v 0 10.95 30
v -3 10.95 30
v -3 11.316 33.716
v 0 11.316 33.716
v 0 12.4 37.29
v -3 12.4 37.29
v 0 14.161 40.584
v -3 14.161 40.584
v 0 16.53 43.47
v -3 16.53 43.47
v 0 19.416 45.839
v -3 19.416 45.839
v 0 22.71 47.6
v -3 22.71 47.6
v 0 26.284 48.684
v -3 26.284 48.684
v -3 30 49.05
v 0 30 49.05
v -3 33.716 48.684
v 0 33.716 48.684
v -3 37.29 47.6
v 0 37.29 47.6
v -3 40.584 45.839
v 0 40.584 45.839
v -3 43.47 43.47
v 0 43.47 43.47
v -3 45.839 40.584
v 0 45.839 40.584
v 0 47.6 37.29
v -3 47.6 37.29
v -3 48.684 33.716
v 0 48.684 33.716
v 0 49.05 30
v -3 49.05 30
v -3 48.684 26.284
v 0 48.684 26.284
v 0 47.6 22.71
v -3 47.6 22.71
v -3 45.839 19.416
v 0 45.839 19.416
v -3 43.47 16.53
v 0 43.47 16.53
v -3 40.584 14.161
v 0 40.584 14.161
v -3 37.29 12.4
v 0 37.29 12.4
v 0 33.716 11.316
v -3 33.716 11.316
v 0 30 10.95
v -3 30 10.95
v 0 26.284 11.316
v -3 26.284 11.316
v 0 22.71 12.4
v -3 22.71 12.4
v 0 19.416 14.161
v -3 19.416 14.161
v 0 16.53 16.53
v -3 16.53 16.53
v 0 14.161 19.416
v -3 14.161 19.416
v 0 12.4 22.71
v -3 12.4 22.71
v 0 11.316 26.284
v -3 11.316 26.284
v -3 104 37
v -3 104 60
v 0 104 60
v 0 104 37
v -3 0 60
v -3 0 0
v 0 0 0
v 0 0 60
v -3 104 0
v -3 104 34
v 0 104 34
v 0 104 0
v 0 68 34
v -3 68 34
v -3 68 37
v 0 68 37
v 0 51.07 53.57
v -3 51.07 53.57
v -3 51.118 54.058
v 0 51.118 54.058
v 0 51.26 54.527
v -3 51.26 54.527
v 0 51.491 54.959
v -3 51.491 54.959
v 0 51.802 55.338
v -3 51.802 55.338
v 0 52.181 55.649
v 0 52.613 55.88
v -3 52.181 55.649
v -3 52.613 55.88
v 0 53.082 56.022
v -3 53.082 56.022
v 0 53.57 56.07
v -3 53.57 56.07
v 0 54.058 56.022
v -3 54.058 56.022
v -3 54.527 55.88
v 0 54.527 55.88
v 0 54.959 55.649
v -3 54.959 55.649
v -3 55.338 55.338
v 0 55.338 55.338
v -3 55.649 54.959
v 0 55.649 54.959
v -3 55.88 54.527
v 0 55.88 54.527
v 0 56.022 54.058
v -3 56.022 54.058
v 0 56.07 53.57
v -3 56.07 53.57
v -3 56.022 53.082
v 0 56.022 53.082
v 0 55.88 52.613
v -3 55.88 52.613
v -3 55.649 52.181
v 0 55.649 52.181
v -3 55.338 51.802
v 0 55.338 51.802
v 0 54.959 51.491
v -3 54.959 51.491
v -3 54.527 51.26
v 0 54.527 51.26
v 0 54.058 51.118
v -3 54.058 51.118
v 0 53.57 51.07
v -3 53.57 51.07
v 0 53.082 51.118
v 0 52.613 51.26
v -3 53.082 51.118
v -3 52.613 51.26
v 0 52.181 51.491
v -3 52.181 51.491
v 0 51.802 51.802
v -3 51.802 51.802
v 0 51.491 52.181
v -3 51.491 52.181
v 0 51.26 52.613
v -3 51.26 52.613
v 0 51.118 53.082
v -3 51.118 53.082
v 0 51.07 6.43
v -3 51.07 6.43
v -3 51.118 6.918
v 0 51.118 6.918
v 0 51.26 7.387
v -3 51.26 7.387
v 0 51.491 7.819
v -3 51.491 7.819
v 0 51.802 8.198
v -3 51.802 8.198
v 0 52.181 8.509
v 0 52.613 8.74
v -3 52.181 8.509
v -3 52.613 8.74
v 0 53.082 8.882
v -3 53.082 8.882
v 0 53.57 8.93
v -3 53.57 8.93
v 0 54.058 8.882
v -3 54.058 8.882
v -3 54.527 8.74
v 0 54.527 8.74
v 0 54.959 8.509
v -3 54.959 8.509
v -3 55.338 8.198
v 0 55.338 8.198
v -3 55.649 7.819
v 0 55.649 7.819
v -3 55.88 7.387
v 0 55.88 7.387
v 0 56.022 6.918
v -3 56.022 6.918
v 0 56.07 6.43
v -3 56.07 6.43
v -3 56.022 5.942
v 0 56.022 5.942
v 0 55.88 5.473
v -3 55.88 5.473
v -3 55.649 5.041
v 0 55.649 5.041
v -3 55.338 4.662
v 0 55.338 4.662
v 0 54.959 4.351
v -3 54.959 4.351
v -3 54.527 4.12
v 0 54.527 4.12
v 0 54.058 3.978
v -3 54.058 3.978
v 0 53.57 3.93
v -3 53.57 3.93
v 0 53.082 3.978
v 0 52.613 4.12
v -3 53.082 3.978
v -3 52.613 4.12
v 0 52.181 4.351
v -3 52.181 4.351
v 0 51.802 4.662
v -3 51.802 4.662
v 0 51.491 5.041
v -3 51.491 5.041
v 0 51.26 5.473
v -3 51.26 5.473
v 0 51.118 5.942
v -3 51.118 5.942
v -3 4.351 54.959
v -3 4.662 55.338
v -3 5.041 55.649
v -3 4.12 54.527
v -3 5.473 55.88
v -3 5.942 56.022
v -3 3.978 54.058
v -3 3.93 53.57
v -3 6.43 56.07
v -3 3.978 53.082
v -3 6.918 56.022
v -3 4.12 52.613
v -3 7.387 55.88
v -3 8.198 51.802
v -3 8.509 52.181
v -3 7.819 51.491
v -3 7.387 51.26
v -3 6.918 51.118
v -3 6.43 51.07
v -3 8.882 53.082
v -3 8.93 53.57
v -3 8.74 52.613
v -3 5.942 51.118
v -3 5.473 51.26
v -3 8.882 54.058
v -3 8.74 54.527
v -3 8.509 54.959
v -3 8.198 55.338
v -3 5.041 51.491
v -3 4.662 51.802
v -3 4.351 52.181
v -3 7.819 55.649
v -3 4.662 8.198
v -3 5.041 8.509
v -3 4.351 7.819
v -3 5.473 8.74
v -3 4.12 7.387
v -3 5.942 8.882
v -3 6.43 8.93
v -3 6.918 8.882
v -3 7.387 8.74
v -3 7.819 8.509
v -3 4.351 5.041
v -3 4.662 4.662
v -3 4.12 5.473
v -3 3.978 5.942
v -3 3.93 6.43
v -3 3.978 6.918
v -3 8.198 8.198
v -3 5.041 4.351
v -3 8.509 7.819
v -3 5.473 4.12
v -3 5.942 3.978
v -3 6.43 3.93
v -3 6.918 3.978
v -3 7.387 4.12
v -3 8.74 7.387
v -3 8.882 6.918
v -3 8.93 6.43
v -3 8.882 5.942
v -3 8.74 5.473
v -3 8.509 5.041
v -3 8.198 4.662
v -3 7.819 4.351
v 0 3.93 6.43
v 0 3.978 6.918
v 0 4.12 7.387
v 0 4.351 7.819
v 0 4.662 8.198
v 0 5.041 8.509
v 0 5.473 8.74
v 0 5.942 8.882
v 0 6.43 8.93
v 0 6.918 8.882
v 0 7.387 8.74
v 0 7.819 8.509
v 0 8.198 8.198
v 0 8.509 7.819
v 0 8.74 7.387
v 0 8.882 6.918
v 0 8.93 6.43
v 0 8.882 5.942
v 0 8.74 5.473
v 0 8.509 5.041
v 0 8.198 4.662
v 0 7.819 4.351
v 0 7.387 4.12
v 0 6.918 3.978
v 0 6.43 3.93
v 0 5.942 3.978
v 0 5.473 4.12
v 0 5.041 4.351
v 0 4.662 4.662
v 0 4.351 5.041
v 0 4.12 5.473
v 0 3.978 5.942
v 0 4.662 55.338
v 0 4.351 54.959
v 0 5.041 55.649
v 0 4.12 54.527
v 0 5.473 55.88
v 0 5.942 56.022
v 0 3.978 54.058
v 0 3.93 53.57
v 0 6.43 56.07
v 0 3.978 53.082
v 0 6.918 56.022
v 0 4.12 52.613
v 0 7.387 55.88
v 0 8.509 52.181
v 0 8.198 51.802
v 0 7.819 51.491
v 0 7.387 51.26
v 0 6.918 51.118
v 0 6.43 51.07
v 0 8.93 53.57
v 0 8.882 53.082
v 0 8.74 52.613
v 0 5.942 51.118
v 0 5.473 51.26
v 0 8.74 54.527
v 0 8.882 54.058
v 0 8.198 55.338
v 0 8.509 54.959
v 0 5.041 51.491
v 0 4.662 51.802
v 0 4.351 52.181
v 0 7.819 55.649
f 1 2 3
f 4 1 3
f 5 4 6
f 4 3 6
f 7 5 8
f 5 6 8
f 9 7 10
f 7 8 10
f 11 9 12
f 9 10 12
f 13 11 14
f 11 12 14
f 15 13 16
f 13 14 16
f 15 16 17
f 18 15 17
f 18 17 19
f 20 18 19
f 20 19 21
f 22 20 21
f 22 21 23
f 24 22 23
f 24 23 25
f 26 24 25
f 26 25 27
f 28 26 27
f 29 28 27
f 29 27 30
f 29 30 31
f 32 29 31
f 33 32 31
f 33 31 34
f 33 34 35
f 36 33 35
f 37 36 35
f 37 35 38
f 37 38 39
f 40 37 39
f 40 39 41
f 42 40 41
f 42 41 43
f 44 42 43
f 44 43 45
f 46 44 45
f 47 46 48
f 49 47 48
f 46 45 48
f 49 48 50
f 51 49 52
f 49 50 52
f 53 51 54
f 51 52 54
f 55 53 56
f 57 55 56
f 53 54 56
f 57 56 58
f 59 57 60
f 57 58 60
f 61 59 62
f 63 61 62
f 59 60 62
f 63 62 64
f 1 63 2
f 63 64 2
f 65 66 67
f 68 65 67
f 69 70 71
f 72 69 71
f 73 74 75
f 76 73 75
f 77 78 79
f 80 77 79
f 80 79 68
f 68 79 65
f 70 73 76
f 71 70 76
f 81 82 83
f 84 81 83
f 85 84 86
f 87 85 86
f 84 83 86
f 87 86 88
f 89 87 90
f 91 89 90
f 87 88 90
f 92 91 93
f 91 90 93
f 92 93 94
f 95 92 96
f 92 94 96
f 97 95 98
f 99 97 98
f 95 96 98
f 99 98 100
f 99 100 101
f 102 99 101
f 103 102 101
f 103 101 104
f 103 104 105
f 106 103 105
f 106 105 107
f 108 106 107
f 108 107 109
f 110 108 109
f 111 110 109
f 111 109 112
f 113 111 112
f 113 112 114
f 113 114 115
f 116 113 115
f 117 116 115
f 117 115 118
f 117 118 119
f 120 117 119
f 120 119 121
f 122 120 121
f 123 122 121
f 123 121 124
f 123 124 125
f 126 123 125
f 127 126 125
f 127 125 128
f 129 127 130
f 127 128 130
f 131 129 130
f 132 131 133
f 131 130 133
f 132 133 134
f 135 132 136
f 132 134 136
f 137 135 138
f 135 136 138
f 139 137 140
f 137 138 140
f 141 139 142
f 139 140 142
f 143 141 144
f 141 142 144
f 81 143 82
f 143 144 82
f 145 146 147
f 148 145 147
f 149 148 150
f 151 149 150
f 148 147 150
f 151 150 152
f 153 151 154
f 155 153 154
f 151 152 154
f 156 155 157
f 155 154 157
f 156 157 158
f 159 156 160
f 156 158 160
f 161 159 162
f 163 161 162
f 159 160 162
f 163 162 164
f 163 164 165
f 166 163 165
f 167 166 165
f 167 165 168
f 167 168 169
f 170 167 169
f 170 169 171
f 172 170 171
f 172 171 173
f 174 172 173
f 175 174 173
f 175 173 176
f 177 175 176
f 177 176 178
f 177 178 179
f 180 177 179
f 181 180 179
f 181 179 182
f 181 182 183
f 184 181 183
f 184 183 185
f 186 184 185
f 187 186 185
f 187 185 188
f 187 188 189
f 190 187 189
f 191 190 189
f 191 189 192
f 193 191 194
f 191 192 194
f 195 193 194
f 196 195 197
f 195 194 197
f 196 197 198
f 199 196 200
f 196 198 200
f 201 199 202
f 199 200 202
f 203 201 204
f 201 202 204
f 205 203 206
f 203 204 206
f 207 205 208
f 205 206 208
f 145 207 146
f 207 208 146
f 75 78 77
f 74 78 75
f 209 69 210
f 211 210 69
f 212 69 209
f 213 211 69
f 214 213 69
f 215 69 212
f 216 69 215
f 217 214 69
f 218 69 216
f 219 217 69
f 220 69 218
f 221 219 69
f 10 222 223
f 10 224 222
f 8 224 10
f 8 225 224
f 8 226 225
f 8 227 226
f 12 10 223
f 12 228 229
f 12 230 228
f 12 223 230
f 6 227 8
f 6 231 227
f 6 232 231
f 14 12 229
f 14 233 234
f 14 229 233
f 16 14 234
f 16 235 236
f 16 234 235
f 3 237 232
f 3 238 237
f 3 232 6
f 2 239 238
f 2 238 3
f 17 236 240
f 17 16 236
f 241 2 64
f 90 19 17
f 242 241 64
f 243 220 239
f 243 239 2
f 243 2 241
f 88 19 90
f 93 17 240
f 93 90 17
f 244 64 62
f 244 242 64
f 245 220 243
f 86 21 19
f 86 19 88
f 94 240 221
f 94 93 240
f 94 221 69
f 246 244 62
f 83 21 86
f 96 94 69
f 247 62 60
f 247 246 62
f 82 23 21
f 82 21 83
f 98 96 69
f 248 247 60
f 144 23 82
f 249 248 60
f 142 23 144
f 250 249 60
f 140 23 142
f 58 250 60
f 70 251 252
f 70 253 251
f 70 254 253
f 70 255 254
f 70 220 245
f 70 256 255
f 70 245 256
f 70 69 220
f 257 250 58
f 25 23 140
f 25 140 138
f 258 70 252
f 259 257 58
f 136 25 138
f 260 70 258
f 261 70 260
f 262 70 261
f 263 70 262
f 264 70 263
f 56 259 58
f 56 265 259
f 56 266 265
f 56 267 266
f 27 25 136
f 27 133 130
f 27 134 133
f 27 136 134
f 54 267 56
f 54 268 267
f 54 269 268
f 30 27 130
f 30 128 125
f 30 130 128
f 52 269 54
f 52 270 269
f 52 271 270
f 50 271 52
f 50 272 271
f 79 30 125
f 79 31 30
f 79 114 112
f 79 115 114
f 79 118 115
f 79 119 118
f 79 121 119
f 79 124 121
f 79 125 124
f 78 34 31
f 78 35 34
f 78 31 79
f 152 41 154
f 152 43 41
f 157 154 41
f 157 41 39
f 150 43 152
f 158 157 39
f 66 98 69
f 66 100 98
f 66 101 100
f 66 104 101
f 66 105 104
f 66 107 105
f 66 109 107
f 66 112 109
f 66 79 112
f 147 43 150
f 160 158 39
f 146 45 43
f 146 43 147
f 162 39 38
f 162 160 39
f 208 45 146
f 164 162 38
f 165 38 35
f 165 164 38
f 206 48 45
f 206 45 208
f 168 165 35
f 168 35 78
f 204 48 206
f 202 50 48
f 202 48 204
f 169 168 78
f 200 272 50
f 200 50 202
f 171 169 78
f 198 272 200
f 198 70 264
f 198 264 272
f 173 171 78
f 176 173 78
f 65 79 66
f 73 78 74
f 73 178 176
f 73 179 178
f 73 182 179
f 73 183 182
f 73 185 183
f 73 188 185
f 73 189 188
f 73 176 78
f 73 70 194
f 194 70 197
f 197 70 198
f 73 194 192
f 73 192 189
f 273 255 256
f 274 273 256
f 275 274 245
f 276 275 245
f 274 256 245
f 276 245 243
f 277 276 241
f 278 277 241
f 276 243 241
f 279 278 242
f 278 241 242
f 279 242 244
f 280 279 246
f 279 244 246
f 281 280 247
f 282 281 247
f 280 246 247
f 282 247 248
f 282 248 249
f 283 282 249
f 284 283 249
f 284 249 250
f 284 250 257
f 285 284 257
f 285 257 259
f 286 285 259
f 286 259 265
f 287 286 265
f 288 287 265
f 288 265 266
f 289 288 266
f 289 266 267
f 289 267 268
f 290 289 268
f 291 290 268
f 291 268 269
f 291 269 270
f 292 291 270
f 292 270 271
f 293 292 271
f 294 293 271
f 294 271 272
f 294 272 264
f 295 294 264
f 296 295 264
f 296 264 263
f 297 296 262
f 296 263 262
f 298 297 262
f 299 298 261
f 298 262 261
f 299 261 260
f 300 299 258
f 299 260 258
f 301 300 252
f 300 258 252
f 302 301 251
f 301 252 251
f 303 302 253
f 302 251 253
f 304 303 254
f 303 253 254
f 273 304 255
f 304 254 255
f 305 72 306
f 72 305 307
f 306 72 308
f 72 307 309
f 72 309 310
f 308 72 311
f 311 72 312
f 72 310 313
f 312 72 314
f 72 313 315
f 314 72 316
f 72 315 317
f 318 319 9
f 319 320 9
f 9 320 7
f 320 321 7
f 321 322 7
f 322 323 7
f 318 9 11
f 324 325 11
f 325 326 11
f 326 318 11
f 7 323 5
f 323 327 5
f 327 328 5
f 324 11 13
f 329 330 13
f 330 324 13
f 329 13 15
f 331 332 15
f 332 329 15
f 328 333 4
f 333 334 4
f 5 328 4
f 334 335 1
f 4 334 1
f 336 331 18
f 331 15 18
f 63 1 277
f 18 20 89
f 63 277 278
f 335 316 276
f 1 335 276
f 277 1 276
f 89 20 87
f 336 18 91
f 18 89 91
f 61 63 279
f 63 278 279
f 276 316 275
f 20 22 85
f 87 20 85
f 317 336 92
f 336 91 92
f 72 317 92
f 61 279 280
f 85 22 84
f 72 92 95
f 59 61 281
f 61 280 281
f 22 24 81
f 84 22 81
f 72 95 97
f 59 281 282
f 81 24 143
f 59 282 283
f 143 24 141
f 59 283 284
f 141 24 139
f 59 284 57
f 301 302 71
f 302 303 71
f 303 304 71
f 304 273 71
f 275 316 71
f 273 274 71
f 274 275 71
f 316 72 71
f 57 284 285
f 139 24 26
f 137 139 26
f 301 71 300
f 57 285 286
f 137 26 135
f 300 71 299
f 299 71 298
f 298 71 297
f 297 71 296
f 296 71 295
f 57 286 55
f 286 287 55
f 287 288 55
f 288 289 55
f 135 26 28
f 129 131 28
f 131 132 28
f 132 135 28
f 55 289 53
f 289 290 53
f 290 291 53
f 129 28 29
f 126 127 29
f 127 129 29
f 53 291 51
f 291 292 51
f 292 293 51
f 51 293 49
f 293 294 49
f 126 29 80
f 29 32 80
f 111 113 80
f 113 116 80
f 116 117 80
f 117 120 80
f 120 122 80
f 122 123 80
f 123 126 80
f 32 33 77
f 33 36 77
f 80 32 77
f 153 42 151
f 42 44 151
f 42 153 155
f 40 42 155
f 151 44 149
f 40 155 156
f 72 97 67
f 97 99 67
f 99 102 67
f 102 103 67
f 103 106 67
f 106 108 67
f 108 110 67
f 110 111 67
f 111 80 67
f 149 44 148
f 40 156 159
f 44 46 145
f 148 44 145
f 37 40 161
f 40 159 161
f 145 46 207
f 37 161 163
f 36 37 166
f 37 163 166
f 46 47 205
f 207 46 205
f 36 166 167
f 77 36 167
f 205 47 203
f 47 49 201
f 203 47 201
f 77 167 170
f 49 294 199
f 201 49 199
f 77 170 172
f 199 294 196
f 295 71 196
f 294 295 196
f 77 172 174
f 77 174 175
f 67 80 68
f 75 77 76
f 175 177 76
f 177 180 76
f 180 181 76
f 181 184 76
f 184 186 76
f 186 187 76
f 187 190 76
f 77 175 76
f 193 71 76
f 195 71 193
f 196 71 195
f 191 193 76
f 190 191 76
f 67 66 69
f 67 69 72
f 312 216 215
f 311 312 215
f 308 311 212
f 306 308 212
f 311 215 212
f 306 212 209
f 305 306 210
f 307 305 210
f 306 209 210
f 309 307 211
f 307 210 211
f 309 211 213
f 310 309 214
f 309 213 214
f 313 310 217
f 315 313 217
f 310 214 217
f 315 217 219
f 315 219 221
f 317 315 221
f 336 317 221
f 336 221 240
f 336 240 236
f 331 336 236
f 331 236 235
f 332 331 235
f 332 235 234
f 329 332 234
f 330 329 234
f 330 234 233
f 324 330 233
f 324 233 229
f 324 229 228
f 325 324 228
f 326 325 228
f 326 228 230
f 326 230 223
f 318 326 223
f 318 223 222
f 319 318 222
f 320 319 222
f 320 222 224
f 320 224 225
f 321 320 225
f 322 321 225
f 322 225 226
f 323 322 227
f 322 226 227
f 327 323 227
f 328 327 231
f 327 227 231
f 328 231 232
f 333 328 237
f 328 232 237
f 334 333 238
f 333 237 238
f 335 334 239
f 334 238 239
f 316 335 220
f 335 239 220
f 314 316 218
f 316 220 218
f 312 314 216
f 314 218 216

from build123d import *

# Parameters (mm, degrees)
SKETCH2_W          = 3
SKETCH2_H          = 104
BASE_FLANGE1_DEPTH = 60
SKETCH4_R          = 2.5
SKETCH4_R_2        = 19.05
CUT_EXTRUDE2_DEPTH = 10
SKETCH5_W          = 3
SKETCH5_H          = 36
CUT_EXTRUDE4_DEPTH = 10


# Sheet-metal steps are written as plain solids
with BuildPart() as part:
    # Sketch2 → Base-Flange1 (new body)
    with BuildSketch(Plane.XY):
        with Locations((-1.5, 52)):
            Rectangle(SKETCH2_W, SKETCH2_H)
    extrude(amount=BASE_FLANGE1_DEPTH)

    # Sketch4 → Cut-Extrude2 (cut)
    with BuildSketch(Plane.ZY.offset(3)):
        with Locations(Location((6.43, 6.43, 0), (0, 0, 270))):
            Circle(SKETCH4_R)
        with Locations(Location((30, 30, 0), (0, 0, 270))):
            Circle(SKETCH4_R_2)
        with Locations(Location((6.43, 53.57, 0), (0, 0, 270))):
            Circle(SKETCH4_R)
        with Locations(Location((53.57, 6.43, 0), (0, 0, 270))):
            Circle(SKETCH4_R)
        with Locations(Location((53.57, 53.57, 0), (0, 0, 270))):
            Circle(SKETCH4_R)
    extrude(amount=-CUT_EXTRUDE2_DEPTH, mode=Mode.SUBTRACT)

    # Sketch5 → Cut-Extrude4 (cut)
    with BuildSketch(Plane.ZY.offset(3)):
        with Locations((35.5, 86)):
            Rectangle(SKETCH5_W, SKETCH5_H)
    extrude(amount=-CUT_EXTRUDE4_DEPTH, mode=Mode.SUBTRACT)


solid = part.part
